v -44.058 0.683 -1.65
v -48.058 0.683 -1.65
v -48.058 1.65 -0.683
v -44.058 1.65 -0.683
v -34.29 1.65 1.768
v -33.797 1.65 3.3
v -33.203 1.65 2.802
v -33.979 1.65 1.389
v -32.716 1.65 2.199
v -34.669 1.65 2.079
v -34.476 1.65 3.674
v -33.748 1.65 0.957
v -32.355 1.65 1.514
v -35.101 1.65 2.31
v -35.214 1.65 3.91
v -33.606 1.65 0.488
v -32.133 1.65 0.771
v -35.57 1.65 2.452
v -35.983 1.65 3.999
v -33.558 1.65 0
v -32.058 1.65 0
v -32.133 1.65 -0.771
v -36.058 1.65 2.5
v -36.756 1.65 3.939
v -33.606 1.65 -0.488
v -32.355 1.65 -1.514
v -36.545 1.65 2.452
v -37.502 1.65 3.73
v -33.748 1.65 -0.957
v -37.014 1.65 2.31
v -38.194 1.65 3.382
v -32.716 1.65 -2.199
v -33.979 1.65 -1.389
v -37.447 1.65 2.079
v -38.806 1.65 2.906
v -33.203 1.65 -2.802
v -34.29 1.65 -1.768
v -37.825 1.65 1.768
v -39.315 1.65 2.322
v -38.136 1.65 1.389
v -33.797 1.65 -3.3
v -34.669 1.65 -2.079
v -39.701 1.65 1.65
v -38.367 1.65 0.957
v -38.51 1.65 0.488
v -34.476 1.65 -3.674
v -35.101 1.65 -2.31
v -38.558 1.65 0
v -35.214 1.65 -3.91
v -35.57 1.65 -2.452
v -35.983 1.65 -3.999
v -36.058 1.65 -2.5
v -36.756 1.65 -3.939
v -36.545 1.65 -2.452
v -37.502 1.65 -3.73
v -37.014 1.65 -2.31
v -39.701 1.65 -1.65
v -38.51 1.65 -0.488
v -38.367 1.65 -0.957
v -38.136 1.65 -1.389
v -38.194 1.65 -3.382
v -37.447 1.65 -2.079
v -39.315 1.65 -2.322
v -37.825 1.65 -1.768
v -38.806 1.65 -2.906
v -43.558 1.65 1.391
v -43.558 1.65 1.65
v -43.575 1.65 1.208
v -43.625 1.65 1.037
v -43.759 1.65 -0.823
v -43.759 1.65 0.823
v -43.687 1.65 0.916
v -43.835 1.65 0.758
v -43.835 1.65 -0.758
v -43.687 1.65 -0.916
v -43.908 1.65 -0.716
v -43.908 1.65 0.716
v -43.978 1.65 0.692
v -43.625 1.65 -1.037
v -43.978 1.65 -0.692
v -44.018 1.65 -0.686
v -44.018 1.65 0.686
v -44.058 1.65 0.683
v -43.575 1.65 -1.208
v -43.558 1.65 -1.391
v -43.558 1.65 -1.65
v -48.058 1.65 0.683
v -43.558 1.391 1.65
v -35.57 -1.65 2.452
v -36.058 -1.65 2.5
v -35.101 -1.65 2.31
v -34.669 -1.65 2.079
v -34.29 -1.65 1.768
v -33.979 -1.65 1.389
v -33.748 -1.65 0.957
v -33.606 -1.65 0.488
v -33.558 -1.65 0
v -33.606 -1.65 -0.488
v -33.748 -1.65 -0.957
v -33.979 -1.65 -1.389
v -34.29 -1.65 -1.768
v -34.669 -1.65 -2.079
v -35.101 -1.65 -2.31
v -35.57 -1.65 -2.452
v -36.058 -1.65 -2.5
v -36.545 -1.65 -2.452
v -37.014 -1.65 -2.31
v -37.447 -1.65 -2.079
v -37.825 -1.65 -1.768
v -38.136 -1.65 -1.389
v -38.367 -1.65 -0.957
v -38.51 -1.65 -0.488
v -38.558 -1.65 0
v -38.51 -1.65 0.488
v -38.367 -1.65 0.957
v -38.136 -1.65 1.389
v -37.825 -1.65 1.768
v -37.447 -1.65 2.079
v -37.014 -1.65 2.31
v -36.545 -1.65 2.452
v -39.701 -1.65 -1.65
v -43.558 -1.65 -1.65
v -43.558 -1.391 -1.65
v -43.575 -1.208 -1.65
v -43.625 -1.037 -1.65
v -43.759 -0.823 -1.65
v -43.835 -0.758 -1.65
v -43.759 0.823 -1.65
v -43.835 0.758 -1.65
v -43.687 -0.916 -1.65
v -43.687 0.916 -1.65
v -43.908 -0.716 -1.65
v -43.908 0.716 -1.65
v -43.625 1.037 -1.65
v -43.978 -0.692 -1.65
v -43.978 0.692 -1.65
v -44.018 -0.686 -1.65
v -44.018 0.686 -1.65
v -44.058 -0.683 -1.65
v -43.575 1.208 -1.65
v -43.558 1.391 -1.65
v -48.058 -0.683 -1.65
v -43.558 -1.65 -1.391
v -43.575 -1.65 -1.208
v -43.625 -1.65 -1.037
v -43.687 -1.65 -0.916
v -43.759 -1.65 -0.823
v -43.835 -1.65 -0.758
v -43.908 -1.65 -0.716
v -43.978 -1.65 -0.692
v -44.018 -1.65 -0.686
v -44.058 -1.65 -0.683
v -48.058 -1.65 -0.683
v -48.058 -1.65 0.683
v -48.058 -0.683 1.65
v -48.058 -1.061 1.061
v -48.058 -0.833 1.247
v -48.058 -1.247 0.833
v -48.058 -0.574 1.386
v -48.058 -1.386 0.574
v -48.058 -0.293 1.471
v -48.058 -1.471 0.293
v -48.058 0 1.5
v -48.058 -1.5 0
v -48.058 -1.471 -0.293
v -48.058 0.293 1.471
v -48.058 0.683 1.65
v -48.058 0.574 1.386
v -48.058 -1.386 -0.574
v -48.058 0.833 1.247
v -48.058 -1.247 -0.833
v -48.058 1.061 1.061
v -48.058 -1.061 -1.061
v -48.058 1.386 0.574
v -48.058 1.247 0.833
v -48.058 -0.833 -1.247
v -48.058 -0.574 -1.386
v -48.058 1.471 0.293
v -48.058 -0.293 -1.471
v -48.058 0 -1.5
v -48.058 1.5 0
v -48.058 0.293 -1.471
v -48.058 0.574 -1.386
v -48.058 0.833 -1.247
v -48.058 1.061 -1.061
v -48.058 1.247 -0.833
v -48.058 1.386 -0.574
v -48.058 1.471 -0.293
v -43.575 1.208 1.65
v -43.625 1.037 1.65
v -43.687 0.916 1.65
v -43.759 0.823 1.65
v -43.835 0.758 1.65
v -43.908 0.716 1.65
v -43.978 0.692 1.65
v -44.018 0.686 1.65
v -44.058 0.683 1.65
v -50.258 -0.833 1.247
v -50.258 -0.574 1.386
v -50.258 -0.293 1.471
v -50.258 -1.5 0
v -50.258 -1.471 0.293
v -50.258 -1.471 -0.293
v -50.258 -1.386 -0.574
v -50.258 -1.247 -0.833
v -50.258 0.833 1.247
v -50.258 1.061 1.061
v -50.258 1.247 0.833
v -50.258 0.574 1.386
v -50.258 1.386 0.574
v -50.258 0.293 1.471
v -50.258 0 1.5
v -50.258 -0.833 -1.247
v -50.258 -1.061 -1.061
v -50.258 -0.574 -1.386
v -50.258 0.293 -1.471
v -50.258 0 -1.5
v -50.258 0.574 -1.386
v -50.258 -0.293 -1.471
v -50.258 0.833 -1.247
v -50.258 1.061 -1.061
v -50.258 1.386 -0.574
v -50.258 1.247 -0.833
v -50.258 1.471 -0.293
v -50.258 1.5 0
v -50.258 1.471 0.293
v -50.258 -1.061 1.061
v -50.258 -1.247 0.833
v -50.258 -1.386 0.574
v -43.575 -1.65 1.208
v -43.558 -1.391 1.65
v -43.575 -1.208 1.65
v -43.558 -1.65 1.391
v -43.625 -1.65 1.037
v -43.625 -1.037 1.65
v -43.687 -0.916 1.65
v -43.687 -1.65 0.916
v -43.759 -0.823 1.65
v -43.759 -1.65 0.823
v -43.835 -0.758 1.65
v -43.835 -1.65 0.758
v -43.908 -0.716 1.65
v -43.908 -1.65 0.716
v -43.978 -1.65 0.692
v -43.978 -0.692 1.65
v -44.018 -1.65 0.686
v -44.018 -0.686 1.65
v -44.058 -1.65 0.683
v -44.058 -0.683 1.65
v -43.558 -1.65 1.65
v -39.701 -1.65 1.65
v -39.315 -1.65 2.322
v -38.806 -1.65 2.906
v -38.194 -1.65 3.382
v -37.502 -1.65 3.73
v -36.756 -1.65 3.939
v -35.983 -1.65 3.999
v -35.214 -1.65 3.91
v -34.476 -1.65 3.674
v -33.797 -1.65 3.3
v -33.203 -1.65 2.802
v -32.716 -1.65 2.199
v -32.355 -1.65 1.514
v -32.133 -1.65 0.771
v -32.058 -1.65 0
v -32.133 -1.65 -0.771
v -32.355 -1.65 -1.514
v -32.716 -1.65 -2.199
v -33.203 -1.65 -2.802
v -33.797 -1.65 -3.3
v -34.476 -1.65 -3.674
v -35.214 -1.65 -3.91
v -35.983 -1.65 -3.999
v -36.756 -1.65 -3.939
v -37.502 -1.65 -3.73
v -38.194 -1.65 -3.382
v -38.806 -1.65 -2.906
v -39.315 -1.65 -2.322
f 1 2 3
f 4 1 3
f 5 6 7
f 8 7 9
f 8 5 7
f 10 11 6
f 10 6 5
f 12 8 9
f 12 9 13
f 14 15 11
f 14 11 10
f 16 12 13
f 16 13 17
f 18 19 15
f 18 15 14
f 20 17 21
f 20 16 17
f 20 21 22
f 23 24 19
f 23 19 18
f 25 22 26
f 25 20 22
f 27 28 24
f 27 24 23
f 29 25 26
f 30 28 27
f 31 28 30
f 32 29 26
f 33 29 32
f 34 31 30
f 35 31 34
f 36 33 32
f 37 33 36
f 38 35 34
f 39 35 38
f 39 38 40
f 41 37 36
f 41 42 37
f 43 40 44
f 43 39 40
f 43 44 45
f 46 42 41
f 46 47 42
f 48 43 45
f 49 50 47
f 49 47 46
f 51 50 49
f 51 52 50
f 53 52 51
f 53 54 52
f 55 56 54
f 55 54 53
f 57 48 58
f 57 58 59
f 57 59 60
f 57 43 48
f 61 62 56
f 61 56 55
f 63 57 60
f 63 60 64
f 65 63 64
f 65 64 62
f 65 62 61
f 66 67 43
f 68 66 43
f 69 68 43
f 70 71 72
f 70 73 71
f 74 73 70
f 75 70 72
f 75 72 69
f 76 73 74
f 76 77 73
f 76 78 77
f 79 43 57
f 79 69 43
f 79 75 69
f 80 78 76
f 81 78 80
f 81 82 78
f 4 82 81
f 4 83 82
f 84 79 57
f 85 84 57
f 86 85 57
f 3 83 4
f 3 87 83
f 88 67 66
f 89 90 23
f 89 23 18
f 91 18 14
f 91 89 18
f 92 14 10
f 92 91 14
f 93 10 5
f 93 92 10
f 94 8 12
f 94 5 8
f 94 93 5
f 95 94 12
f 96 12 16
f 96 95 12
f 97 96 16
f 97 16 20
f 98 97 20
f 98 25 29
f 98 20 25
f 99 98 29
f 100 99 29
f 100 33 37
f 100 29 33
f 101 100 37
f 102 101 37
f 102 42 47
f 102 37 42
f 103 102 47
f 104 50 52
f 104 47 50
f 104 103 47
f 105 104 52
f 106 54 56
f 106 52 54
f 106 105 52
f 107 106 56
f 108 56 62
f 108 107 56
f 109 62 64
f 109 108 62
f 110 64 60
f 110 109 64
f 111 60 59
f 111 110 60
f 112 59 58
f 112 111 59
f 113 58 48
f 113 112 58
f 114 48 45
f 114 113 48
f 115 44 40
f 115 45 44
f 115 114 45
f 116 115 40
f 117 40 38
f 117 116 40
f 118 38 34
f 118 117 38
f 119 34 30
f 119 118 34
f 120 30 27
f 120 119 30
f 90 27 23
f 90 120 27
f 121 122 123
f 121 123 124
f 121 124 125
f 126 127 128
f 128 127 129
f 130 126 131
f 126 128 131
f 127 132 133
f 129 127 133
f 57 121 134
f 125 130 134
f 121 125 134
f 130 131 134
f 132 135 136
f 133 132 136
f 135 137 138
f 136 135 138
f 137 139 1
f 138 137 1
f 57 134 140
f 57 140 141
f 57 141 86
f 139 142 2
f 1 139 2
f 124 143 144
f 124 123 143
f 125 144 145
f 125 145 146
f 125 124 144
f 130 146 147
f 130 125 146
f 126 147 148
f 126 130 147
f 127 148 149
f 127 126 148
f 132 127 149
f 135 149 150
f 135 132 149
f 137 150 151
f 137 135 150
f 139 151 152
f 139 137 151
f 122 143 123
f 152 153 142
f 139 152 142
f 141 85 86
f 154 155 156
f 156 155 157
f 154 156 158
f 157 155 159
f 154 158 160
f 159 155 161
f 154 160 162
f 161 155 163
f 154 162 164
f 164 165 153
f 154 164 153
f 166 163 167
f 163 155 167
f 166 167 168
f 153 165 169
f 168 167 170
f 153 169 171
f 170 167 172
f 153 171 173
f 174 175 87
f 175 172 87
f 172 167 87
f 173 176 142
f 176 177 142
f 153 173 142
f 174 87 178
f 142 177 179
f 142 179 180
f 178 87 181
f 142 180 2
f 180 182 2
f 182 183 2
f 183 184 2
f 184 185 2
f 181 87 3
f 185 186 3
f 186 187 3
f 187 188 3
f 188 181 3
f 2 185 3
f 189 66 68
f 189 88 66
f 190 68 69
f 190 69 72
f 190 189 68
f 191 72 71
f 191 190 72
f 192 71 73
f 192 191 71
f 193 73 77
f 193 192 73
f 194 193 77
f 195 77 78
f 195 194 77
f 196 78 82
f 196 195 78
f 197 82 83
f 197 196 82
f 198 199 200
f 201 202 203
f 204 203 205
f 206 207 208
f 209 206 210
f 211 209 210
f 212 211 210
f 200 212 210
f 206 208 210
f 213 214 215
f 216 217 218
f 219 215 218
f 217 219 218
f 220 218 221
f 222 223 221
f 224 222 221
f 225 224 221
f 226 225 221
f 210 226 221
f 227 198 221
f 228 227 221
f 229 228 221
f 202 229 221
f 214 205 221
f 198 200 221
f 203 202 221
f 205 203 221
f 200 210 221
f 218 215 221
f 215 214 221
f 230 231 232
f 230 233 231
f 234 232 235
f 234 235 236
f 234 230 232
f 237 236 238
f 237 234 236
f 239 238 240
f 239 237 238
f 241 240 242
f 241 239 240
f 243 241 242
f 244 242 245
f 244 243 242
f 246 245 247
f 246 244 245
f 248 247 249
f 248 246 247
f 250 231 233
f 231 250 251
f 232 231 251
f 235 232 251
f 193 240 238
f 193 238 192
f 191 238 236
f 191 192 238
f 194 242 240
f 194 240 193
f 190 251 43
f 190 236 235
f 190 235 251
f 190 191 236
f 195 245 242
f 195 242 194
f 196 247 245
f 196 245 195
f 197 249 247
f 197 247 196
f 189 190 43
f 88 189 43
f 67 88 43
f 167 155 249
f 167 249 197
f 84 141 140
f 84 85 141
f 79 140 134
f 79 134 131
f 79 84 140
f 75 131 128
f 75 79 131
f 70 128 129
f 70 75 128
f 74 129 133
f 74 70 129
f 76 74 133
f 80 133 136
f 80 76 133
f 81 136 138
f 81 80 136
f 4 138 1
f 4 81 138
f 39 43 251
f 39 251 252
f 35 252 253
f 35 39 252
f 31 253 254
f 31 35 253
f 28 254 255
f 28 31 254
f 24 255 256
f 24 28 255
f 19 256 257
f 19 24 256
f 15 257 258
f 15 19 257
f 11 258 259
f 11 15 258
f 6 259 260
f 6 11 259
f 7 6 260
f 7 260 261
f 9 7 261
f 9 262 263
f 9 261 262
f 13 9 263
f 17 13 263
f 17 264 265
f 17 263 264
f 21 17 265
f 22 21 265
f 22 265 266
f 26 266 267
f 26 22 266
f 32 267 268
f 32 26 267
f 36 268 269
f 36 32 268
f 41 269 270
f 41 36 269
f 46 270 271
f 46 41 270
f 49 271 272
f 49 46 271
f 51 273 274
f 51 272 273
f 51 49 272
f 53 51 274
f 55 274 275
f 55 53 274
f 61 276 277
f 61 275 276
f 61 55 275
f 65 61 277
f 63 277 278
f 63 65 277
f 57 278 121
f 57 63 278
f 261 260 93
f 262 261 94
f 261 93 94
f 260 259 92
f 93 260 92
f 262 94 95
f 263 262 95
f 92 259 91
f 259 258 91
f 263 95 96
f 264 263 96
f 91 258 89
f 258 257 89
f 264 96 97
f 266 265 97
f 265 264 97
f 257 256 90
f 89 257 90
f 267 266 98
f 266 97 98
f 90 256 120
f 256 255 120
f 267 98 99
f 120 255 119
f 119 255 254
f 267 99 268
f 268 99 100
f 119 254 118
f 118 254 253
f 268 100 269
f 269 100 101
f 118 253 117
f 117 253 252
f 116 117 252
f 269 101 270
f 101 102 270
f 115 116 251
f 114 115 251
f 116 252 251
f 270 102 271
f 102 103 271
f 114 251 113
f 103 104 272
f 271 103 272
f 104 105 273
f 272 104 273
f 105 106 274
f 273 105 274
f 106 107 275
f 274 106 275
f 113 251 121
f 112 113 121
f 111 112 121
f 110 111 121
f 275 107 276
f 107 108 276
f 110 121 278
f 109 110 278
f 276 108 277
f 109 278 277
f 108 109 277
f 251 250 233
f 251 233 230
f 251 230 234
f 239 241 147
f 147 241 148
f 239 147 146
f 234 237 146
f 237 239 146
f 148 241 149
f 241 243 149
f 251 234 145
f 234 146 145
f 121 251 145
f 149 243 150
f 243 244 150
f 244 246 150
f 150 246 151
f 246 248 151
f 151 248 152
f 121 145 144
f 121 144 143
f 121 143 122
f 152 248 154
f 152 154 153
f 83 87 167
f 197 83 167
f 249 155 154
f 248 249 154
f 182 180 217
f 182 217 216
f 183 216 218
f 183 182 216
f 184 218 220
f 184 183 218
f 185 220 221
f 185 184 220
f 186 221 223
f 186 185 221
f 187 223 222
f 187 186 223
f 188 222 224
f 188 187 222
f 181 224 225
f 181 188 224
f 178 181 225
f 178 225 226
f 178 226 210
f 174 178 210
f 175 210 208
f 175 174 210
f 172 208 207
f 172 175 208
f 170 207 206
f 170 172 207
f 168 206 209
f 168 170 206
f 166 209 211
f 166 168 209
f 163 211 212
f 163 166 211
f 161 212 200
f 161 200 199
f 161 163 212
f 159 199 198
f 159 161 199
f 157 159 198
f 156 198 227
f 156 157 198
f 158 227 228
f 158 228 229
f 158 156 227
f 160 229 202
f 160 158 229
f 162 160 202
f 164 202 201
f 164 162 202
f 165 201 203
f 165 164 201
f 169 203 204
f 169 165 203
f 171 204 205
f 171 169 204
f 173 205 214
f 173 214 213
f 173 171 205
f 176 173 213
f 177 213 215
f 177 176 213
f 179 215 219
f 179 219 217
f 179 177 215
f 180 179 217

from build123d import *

# Parameters (mm, degrees)
SKETCH1_R                = 40
SKETCH1_R_2              = 25
BOSS_EXTRUDE1_DEPTH      = 18
BOSS_EXTRUDE2_DEPTH      = 45
SKETCH3_R                = 15
BOSS_EXTRUDE3_DEPTH      = 22
BOSS_EXTRUDE4_REACH      = 125.081
SKETCH4_W                = 33
SKETCH4_H                = 33
FILLET1_R                = 5
FILLET7_R                = 1.5
SCALA2_SCALE             = 0.1
SCHIZZO3_W               = 13.390862708
SCHIZZO3_H               = 12.193146248
TAGLIO_ESTRUSIONE3_DEPTH = 0.15
SCHIZZO4_W               = 17.573052966
SCHIZZO4_H               = 12.055703376
TAGLIO_ESTRUSIONE4_DEPTH = 0.15


with BuildPart() as part:
    # Sketch1 → Boss-Extrude1 (new, symmetric)
    with BuildSketch(Plane(origin=(0, 0, 0), x_dir=(1, 0, 0), z_dir=(0, 1, 0))):
        with Locations(Location((0, 0, 0), (0, 0, 270))):
            Circle(SKETCH1_R)
        with Locations(Location((0, 0, 0), (0, 0, 270))):
            Circle(SKETCH1_R_2, mode=Mode.SUBTRACT)
    extrude(amount=BOSS_EXTRUDE1_DEPTH, both=True)

    # Sketch4 → Boss-Extrude4 (add, up to next)
    with BuildSketch(Plane(origin=(-75, 0, 0), x_dir=(0, 0, -1), z_dir=(1, 0, 0)), mode=Mode.PRIVATE) as boss_extrude4_sk1:
        Rectangle(SKETCH4_W, SKETCH4_H)
    boss_extrude4_tool1 = extrude(boss_extrude4_sk1.sketch, amount=BOSS_EXTRUDE4_REACH, mode=Mode.PRIVATE) - part.part


with BuildPart() as body_2:
    # Sketch2 → Boss-Extrude2 (new body)
    with BuildSketch(Plane(origin=(-120, 0, 0), x_dir=(0, 0, -1), z_dir=(1, 0, 0))):
        Polygon((-16.5, 6.834523779), (-16.5, -6.834523779), (-6.834523779, -16.5), (6.834523779, -16.5), (16.5, -6.834523779), (16.5, 6.834523779), (6.834523779, 16.5), (-6.834523779, 16.5), align=None)
    extrude(amount=BOSS_EXTRUDE2_DEPTH)

    # Sketch3 → Boss-Extrude3 (add)
    with BuildSketch(Plane(origin=(-120, 0, 0), x_dir=(0, 0, -1), z_dir=(1, 0, 0))):
        Circle(SKETCH3_R)
    extrude(amount=-BOSS_EXTRUDE3_DEPTH)


with BuildPart() as part_1:
    add(part.part)

    add(body_2.part)  # Boss-Extrude4 merges body 2
    add(boss_extrude4_tool1.solids().sort_by_distance((-75, 0, 0))[0])

    # Fillet1
    fillet1_edges = [part_1.edges().sort_by_distance(p)[0] for p in [
        (-75, 11.66726189, 11.66726189),
        (-75, -11.66726189, 11.66726189),
        (-75, -11.66726189, -11.66726189),
        (-75, 11.66726189, -11.66726189),
    ]]
    fillet(fillet1_edges, radius=FILLET1_R)

    # Fillet7
    fillet7_edges = [part_1.edges().sort_by_distance(p)[0] for p in [
        (-40, -16.5, 0),
        (-40, 16.5, 0),
    ]]
    fillet(fillet7_edges, radius=FILLET7_R - 0.0001)  # a hair under: the kernel refuses the full size


with BuildPart() as part_2:
    # Scala2: scaled about (-40.064009794, 0, -1e-09)
    add(part_1.part.scale(SCALA2_SCALE).moved(Location((-36.057608815, 0, -1e-09))))

    # Schizzo3 → Taglio-Estrusione3 (cut)
    with BuildSketch(Plane(origin=(0, 1.8, 0), x_dir=(1, 0, 0), z_dir=(0, 1, 0))):
        with Locations((-35.542120141, -0.94246541)):
            Rectangle(SCHIZZO3_W, SCHIZZO3_H)
    extrude(amount=-TAGLIO_ESTRUSIONE3_DEPTH, mode=Mode.SUBTRACT)

    # Schizzo4 → Taglio-Estrusione4 (cut)
    with BuildSketch(Plane.XZ.offset(1.8)):
        with Locations((-38.634584769, -0.834474582)):
            Rectangle(SCHIZZO4_W, SCHIZZO4_H)
    extrude(amount=-TAGLIO_ESTRUSIONE4_DEPTH, mode=Mode.SUBTRACT)


solid = part_2.part
